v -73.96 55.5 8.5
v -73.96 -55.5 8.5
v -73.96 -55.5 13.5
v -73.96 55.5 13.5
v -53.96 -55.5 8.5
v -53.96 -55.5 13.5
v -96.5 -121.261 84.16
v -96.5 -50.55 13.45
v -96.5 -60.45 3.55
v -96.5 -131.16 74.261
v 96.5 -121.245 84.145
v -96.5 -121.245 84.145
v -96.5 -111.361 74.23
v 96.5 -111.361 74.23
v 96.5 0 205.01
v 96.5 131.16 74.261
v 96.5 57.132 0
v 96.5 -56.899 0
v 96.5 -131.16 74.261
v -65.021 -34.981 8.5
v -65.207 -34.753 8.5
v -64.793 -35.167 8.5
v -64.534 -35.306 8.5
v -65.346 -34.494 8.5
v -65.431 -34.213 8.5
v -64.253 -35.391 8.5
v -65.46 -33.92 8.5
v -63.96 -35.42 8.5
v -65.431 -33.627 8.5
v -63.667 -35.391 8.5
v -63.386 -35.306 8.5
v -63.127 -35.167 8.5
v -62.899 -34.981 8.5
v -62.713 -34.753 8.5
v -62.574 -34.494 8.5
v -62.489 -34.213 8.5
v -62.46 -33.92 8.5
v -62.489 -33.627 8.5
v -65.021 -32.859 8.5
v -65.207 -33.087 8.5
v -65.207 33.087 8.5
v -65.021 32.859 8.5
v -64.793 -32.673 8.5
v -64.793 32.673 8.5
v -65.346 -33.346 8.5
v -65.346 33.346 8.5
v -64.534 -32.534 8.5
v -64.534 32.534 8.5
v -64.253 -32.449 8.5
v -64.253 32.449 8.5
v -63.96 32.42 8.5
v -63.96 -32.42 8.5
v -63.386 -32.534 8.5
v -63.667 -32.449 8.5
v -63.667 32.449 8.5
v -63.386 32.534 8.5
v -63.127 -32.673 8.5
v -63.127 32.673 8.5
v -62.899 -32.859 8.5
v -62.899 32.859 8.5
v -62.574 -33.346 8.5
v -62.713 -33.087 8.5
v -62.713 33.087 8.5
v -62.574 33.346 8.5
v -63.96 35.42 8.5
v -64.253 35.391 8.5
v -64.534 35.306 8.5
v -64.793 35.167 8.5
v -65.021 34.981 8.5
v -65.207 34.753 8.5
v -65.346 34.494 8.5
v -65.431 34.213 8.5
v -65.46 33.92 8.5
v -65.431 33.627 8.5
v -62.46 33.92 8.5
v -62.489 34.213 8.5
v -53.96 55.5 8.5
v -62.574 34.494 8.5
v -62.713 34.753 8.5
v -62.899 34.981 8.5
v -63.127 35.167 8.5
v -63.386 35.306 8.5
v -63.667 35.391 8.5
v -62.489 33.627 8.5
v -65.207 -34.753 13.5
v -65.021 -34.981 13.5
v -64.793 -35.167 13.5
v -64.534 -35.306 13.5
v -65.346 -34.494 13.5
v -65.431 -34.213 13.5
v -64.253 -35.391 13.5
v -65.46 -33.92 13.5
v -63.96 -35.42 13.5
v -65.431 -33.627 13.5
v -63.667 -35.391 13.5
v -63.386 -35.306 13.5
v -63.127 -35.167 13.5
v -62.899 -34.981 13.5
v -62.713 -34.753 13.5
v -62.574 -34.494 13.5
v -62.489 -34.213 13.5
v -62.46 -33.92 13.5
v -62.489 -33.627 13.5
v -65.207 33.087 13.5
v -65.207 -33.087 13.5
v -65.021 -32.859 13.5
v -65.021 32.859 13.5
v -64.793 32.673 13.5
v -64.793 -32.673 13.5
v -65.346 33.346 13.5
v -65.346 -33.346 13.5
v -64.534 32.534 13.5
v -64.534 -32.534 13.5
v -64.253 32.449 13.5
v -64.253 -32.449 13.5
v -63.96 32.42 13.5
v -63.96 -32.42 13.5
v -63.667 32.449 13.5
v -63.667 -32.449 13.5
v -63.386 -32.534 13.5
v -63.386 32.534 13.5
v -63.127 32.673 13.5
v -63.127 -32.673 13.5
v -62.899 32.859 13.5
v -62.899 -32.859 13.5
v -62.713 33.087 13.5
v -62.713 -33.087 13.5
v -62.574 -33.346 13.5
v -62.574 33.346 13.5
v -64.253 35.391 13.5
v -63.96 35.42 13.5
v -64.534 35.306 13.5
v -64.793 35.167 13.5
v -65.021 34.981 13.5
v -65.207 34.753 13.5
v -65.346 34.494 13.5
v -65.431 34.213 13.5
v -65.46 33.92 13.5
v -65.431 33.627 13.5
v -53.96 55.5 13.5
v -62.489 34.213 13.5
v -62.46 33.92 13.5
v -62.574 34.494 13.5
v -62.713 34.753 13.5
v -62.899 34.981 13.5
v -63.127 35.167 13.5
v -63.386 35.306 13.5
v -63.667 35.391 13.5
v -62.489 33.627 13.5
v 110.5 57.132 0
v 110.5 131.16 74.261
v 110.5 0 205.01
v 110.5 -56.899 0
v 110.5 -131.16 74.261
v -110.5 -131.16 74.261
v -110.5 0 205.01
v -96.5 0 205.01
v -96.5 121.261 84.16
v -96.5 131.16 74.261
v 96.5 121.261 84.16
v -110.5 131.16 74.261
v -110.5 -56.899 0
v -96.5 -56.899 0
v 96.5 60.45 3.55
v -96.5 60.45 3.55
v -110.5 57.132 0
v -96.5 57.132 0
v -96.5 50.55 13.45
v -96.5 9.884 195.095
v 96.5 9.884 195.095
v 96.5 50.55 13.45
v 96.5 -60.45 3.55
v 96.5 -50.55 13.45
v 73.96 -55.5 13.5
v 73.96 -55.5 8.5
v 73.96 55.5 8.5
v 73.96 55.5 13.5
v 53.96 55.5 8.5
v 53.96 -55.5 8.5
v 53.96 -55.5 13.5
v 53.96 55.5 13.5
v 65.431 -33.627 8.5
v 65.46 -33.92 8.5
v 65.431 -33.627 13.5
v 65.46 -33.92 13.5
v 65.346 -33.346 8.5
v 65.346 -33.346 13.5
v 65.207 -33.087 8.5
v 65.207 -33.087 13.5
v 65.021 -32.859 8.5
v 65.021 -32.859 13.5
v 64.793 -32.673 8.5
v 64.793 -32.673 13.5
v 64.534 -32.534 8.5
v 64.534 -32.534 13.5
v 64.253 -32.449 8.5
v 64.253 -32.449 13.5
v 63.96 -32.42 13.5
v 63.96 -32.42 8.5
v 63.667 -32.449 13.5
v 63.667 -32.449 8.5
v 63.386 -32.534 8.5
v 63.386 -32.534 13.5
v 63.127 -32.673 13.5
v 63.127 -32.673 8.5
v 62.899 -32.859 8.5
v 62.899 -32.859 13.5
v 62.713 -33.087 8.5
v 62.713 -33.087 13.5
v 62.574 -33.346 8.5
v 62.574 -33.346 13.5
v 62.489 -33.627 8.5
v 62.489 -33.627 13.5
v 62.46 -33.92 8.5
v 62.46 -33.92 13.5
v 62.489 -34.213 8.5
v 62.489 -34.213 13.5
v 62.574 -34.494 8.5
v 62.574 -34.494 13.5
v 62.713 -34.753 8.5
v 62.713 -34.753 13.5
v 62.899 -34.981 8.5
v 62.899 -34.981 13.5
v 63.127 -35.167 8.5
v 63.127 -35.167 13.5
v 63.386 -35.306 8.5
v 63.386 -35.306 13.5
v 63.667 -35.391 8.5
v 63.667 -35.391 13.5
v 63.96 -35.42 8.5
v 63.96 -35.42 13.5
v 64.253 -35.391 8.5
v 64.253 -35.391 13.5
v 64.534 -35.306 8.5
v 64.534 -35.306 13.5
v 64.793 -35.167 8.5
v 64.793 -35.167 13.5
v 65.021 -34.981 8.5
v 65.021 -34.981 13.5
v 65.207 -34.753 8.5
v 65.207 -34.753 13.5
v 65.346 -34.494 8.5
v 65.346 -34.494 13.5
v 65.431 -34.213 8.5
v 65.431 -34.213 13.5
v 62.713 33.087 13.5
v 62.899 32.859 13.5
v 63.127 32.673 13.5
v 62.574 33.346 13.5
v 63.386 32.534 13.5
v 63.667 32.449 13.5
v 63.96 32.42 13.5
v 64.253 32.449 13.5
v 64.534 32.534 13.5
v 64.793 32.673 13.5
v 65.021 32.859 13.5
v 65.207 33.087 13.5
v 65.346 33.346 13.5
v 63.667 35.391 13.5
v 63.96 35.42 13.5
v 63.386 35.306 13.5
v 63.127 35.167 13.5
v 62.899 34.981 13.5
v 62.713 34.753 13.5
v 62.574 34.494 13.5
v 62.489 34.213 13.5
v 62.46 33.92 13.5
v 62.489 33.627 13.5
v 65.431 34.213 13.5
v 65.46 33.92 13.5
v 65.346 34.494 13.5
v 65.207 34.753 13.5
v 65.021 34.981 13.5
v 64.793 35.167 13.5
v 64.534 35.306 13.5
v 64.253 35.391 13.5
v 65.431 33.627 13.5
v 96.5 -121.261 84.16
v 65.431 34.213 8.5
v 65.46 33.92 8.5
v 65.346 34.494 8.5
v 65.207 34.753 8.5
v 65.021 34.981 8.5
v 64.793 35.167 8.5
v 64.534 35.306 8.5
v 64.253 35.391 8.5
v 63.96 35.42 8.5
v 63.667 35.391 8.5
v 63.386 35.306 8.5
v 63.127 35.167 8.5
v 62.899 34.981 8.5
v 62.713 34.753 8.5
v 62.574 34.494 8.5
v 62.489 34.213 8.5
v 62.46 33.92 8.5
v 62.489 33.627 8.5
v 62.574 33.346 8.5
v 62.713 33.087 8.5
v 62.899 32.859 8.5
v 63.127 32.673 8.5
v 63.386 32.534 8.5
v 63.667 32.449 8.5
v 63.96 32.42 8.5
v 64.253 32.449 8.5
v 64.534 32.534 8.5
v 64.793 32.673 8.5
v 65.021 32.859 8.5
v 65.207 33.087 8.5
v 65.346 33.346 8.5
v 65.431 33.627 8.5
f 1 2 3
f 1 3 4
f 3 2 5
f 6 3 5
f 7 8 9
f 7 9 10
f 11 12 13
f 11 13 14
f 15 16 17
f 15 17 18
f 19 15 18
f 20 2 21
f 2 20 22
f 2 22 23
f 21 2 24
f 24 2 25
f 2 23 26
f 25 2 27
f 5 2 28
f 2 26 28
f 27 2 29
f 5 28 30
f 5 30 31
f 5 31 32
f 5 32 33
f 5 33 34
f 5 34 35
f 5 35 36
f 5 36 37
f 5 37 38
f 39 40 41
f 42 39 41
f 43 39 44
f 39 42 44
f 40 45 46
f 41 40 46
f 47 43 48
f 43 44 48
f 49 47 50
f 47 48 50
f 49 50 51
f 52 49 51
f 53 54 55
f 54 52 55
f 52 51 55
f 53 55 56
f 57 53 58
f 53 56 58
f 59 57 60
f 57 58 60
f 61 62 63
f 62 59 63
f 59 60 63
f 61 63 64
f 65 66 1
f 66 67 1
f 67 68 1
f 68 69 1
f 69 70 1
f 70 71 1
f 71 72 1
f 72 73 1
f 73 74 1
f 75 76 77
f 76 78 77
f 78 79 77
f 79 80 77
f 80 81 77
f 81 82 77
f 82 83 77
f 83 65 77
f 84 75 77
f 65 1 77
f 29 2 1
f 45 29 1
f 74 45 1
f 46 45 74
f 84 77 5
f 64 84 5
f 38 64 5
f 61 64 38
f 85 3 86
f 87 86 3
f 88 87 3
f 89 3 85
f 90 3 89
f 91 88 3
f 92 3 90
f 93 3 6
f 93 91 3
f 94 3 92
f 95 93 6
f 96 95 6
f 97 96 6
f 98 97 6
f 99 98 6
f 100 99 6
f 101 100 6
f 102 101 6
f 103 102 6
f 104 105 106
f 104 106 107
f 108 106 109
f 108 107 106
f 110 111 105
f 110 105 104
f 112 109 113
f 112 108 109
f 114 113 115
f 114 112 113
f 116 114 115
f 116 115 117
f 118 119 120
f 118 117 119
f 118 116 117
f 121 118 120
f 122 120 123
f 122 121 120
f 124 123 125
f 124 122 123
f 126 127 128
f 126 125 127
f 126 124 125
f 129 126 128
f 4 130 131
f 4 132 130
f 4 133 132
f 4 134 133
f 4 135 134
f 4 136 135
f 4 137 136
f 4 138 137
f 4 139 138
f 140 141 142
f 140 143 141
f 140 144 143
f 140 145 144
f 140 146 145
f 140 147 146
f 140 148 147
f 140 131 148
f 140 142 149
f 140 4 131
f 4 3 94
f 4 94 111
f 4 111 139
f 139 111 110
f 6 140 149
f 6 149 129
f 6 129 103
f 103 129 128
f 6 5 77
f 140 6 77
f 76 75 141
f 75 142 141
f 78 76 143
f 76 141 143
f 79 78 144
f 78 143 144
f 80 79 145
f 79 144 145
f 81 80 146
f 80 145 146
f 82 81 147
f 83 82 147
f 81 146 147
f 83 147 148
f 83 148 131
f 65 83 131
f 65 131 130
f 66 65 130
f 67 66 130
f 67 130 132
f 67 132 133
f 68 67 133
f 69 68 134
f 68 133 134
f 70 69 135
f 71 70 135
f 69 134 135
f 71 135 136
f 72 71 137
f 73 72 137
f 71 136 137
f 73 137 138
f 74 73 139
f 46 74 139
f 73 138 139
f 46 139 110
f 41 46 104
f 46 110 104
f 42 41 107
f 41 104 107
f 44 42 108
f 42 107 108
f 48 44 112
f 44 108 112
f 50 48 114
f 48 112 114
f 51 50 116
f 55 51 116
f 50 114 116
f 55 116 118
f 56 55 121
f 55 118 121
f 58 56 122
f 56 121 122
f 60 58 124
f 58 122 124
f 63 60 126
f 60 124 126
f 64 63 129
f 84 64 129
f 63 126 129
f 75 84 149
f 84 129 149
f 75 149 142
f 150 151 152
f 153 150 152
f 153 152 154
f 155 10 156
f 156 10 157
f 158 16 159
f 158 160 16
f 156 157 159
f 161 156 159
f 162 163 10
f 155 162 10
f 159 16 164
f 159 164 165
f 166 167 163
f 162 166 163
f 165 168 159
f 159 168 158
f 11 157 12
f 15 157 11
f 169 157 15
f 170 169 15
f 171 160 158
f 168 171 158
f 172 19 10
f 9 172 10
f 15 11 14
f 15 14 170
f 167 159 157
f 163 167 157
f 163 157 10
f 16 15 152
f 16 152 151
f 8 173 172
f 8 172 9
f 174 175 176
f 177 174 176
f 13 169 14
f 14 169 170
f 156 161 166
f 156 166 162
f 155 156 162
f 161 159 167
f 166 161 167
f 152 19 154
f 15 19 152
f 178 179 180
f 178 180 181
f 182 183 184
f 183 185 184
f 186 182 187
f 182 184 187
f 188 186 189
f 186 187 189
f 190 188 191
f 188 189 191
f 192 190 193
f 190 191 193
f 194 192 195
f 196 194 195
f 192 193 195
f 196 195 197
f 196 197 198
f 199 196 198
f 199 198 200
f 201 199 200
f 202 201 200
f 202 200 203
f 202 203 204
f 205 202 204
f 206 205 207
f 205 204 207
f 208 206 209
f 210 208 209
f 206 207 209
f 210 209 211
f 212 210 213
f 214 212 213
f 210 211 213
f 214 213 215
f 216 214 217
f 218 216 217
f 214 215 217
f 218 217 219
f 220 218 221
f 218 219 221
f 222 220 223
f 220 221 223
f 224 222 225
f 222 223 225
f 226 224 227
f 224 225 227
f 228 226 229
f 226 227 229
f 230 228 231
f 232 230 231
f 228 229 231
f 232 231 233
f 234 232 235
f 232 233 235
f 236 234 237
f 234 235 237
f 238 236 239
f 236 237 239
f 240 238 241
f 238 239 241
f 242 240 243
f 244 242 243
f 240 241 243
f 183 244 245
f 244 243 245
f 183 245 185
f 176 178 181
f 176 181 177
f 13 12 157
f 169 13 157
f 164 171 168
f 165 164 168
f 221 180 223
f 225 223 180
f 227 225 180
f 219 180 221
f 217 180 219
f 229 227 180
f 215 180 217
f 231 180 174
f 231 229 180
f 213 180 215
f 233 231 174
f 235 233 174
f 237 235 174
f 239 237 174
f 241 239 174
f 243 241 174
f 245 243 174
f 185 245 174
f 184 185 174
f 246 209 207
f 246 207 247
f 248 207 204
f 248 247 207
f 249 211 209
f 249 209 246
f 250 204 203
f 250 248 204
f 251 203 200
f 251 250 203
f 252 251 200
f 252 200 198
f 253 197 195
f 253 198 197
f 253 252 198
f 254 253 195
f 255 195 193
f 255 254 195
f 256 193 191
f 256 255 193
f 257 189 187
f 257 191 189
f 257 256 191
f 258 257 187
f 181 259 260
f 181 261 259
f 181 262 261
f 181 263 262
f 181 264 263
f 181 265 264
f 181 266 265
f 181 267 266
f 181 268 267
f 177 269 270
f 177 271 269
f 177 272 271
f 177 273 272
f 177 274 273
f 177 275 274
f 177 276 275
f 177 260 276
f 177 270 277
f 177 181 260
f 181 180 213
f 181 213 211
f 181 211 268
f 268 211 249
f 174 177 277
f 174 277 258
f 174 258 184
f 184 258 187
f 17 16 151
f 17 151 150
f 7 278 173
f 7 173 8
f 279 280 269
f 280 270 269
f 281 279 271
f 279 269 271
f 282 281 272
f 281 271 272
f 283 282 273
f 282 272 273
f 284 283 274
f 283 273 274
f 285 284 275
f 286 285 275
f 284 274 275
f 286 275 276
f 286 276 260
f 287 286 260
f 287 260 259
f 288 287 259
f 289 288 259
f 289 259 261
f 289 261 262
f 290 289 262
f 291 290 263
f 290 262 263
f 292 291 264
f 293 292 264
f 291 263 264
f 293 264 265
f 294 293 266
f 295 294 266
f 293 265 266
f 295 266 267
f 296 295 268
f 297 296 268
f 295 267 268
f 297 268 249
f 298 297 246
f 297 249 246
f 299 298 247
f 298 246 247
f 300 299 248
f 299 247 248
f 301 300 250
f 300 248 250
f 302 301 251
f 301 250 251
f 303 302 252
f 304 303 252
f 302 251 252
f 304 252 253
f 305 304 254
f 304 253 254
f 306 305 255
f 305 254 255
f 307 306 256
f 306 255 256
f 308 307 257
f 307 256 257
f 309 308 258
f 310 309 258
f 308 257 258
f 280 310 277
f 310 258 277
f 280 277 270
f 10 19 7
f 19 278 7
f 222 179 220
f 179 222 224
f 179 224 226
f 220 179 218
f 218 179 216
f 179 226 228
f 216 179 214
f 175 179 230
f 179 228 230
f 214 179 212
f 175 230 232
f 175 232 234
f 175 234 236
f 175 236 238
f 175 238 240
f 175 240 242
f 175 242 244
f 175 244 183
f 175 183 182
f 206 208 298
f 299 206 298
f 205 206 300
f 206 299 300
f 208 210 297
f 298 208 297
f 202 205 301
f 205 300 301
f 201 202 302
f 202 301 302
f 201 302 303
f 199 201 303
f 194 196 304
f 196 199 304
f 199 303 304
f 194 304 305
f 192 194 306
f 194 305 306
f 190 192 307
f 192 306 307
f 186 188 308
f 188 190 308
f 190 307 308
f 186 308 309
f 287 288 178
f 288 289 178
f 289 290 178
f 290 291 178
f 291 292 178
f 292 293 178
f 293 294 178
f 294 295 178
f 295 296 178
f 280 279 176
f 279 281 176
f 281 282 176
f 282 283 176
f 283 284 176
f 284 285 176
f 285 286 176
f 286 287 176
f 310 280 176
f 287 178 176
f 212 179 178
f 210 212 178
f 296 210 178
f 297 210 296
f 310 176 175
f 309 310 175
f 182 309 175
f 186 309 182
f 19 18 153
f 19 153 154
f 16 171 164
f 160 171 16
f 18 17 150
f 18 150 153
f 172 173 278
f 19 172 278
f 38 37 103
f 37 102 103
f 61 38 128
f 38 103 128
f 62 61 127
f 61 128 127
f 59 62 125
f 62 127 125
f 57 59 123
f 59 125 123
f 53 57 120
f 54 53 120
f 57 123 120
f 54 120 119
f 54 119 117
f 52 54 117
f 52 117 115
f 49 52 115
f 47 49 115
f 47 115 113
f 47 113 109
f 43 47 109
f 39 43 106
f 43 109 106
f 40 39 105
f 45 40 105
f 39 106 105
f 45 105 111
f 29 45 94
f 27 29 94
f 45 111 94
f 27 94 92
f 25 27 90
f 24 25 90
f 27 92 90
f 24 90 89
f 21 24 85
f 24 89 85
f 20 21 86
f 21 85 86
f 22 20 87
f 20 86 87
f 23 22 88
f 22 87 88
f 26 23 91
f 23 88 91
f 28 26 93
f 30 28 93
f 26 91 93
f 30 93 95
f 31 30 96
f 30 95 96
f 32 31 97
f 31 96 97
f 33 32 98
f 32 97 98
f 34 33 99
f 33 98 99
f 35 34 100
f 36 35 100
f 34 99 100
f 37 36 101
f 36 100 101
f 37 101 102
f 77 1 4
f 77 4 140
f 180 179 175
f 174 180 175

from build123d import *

# Parameters (mm, degrees)
F0_W          = 193
F0_H          = 111
F1_DEPTH      = 8.5
F2_W          = 20
F2_H          = 111
F3_DEPTH      = 5
F4_R          = 1.5
F5_DEPTH      = 5.001
F5_DEPTH_BACK = 2.5
F7_W          = 193
F7_H          = 100
F8_DEPTH      = 7
F11_DEPTH     = 14
F13_W         = 193
F13_H         = 171.1982
F14_DEPTH     = 14


with BuildPart() as f1:
    # F0 (on Top) → F1 (new body)
    with BuildSketch(Plane.XY):
        Rectangle(F0_W, F0_H)
    extrude(amount=F1_DEPTH)


with BuildPart() as f3:
    # F2 (on face) → F3 (new body)
    with BuildSketch(Plane.XY.offset(8.5)):
        with Locations((-63.96, 0)):
            Rectangle(F2_W, F2_H)
        with Locations((63.96, 0)):
            Rectangle(F2_W, F2_H)
    extrude(amount=F3_DEPTH)


with BuildPart() as f5_tool:
    # F4 (on face) → F5 (new body, two sides)
    with BuildSketch(Plane.XY.offset(8.5)) as f5_sk:
        with Locations((-63.96, 33.92)):
            Circle(F4_R)
        with Locations((63.96, 33.92)):
            Circle(F4_R)
        with Locations((-63.96, -33.92)):
            Circle(F4_R)
        with Locations((63.96, -33.92)):
            Circle(F4_R)
    extrude(amount=F5_DEPTH)
    extrude(f5_sk.sketch, amount=-F5_DEPTH_BACK)


with BuildPart() as f1_1:
    add(f1.part)

    # F5: cut by f5_tool
    add(f5_tool.part, mode=Mode.SUBTRACT)


with BuildPart() as f3_1:
    add(f3.part)

    # F5: cut by f5_tool
    add(f5_tool.part, mode=Mode.SUBTRACT)


with BuildPart() as f8:
    # F7 (on face) → F8 (new body, symmetric)
    with BuildSketch(Plane(origin=(0, -23.5, -23.5), x_dir=(-1, 0, 0), z_dir=(0, 0.707107, 0.707107))):
        with Locations((0, 95.254834)):
            Rectangle(F7_W, F7_H)
    extrude(amount=F8_DEPTH, both=True)


with BuildPart() as f9_1:
    # F9: instance of F8
    add(f8.part.mirror(Plane.XZ))


with BuildPart() as f11:
    # F10 (on face) → F11 (new body)
    with BuildSketch(Plane(origin=(-96.5, 0, 0), x_dir=(0, -1, 0), z_dir=(-1, 0, 0))):
        Polygon((56.899495, 0), (131.160426, 74.260931), (0, 205.009963), (-131.160426, 74.260931), (-57.132419, 0), align=None)
    extrude(amount=F11_DEPTH)


with BuildPart() as f12_1:
    # F12: instance of F11
    add(f11.part.mirror(Plane.YZ))


with BuildPart() as f14:
    # F13 (on face) → F14 (new body)
    with BuildSketch(Plane(origin=(0, -102.504476, 102.826999), x_dir=(1, 0, 0), z_dir=(0, -0.705995, 0.708217))):
        with Locations((0, 59.136955)):
            Rectangle(F13_W, F13_H)
    extrude(amount=-F14_DEPTH)


solid = Compound([f3_1.part, f8.part, f9_1.part, f11.part, f12_1.part, f14.part])
